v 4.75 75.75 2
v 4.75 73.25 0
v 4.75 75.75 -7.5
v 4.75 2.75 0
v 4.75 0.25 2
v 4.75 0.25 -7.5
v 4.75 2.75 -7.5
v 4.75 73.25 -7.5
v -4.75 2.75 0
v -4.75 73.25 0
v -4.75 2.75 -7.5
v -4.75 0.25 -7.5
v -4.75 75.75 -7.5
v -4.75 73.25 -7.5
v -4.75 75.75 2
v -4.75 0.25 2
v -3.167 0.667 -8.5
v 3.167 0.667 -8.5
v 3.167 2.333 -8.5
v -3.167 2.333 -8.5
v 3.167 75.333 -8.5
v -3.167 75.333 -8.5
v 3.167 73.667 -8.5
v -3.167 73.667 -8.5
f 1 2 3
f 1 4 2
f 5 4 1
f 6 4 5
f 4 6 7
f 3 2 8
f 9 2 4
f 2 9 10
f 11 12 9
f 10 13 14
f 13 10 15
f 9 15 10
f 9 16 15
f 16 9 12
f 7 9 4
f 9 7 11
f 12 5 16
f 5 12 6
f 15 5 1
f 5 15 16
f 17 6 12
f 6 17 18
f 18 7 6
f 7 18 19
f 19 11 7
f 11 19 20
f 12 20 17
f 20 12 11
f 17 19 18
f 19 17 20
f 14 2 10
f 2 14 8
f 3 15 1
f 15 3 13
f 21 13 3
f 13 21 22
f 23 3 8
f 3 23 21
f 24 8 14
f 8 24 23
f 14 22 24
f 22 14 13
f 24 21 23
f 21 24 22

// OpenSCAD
// file: addon_support.scad
iw = 10;  // inner width
it = 3;   // inner thickness
h = 5;    // height
wt = 2;   // wall thickness
m = 0.25; // margin

module addon_holder() {
    module reinforcement() {
        rotate(90, [0, 0, 1])
        rotate(90, [1, 0, 0])
        linear_extrude(height=wt)
        polygon([
            [0, 0],
            [it+wt, 0],
            [0, -h]
        ]);
    }
    
    color("yellow") translate([-wt-iw/2, 0, -h]) {
        difference() {
            cube([iw+2*wt, it+wt, h]);
            translate([wt, -1, -1]) cube([iw, it+1, h+2]);
        }
        reinforcement();
        translate([iw+wt, 0, 0]) reinforcement();
    }
}

module addon_clip() {
    ch = 1.5*h;
    
    color("#fcc705") {
        translate([-(iw-2*m)/2, m, -ch])
        cube([iw-2*m, it-2*m, ch]);
        
        translate([-(iw-2*m)/2, m, 0])
        cube([iw-2*m, it+wt-m, wt]);
    
        translate([0, (it-2*m)/2+m, -ch-1])
        resize([iw-2*m, it-2*m, 1])
        rotate(45, [0, 0, 1])
        cylinder(h=1, r1=it/3, r2=it/2, $fn=4);
    }
}

module addon_bar(width) {
    addon_clip();
    translate([0, width, 0]) mirror([0, 1, 0]) addon_clip();
    
    color("orange")
    translate([-(iw-2*m)/2, it+wt, 0])
    cube([iw-2*m, width-2*(it+wt), wt]);
}

addon_holder();
addon_bar(20);
// main file
bw = 80;  // base width
wt = 2;   // wall thickness

use <addon_support.scad>

addon_bar(bw-2*wt);
